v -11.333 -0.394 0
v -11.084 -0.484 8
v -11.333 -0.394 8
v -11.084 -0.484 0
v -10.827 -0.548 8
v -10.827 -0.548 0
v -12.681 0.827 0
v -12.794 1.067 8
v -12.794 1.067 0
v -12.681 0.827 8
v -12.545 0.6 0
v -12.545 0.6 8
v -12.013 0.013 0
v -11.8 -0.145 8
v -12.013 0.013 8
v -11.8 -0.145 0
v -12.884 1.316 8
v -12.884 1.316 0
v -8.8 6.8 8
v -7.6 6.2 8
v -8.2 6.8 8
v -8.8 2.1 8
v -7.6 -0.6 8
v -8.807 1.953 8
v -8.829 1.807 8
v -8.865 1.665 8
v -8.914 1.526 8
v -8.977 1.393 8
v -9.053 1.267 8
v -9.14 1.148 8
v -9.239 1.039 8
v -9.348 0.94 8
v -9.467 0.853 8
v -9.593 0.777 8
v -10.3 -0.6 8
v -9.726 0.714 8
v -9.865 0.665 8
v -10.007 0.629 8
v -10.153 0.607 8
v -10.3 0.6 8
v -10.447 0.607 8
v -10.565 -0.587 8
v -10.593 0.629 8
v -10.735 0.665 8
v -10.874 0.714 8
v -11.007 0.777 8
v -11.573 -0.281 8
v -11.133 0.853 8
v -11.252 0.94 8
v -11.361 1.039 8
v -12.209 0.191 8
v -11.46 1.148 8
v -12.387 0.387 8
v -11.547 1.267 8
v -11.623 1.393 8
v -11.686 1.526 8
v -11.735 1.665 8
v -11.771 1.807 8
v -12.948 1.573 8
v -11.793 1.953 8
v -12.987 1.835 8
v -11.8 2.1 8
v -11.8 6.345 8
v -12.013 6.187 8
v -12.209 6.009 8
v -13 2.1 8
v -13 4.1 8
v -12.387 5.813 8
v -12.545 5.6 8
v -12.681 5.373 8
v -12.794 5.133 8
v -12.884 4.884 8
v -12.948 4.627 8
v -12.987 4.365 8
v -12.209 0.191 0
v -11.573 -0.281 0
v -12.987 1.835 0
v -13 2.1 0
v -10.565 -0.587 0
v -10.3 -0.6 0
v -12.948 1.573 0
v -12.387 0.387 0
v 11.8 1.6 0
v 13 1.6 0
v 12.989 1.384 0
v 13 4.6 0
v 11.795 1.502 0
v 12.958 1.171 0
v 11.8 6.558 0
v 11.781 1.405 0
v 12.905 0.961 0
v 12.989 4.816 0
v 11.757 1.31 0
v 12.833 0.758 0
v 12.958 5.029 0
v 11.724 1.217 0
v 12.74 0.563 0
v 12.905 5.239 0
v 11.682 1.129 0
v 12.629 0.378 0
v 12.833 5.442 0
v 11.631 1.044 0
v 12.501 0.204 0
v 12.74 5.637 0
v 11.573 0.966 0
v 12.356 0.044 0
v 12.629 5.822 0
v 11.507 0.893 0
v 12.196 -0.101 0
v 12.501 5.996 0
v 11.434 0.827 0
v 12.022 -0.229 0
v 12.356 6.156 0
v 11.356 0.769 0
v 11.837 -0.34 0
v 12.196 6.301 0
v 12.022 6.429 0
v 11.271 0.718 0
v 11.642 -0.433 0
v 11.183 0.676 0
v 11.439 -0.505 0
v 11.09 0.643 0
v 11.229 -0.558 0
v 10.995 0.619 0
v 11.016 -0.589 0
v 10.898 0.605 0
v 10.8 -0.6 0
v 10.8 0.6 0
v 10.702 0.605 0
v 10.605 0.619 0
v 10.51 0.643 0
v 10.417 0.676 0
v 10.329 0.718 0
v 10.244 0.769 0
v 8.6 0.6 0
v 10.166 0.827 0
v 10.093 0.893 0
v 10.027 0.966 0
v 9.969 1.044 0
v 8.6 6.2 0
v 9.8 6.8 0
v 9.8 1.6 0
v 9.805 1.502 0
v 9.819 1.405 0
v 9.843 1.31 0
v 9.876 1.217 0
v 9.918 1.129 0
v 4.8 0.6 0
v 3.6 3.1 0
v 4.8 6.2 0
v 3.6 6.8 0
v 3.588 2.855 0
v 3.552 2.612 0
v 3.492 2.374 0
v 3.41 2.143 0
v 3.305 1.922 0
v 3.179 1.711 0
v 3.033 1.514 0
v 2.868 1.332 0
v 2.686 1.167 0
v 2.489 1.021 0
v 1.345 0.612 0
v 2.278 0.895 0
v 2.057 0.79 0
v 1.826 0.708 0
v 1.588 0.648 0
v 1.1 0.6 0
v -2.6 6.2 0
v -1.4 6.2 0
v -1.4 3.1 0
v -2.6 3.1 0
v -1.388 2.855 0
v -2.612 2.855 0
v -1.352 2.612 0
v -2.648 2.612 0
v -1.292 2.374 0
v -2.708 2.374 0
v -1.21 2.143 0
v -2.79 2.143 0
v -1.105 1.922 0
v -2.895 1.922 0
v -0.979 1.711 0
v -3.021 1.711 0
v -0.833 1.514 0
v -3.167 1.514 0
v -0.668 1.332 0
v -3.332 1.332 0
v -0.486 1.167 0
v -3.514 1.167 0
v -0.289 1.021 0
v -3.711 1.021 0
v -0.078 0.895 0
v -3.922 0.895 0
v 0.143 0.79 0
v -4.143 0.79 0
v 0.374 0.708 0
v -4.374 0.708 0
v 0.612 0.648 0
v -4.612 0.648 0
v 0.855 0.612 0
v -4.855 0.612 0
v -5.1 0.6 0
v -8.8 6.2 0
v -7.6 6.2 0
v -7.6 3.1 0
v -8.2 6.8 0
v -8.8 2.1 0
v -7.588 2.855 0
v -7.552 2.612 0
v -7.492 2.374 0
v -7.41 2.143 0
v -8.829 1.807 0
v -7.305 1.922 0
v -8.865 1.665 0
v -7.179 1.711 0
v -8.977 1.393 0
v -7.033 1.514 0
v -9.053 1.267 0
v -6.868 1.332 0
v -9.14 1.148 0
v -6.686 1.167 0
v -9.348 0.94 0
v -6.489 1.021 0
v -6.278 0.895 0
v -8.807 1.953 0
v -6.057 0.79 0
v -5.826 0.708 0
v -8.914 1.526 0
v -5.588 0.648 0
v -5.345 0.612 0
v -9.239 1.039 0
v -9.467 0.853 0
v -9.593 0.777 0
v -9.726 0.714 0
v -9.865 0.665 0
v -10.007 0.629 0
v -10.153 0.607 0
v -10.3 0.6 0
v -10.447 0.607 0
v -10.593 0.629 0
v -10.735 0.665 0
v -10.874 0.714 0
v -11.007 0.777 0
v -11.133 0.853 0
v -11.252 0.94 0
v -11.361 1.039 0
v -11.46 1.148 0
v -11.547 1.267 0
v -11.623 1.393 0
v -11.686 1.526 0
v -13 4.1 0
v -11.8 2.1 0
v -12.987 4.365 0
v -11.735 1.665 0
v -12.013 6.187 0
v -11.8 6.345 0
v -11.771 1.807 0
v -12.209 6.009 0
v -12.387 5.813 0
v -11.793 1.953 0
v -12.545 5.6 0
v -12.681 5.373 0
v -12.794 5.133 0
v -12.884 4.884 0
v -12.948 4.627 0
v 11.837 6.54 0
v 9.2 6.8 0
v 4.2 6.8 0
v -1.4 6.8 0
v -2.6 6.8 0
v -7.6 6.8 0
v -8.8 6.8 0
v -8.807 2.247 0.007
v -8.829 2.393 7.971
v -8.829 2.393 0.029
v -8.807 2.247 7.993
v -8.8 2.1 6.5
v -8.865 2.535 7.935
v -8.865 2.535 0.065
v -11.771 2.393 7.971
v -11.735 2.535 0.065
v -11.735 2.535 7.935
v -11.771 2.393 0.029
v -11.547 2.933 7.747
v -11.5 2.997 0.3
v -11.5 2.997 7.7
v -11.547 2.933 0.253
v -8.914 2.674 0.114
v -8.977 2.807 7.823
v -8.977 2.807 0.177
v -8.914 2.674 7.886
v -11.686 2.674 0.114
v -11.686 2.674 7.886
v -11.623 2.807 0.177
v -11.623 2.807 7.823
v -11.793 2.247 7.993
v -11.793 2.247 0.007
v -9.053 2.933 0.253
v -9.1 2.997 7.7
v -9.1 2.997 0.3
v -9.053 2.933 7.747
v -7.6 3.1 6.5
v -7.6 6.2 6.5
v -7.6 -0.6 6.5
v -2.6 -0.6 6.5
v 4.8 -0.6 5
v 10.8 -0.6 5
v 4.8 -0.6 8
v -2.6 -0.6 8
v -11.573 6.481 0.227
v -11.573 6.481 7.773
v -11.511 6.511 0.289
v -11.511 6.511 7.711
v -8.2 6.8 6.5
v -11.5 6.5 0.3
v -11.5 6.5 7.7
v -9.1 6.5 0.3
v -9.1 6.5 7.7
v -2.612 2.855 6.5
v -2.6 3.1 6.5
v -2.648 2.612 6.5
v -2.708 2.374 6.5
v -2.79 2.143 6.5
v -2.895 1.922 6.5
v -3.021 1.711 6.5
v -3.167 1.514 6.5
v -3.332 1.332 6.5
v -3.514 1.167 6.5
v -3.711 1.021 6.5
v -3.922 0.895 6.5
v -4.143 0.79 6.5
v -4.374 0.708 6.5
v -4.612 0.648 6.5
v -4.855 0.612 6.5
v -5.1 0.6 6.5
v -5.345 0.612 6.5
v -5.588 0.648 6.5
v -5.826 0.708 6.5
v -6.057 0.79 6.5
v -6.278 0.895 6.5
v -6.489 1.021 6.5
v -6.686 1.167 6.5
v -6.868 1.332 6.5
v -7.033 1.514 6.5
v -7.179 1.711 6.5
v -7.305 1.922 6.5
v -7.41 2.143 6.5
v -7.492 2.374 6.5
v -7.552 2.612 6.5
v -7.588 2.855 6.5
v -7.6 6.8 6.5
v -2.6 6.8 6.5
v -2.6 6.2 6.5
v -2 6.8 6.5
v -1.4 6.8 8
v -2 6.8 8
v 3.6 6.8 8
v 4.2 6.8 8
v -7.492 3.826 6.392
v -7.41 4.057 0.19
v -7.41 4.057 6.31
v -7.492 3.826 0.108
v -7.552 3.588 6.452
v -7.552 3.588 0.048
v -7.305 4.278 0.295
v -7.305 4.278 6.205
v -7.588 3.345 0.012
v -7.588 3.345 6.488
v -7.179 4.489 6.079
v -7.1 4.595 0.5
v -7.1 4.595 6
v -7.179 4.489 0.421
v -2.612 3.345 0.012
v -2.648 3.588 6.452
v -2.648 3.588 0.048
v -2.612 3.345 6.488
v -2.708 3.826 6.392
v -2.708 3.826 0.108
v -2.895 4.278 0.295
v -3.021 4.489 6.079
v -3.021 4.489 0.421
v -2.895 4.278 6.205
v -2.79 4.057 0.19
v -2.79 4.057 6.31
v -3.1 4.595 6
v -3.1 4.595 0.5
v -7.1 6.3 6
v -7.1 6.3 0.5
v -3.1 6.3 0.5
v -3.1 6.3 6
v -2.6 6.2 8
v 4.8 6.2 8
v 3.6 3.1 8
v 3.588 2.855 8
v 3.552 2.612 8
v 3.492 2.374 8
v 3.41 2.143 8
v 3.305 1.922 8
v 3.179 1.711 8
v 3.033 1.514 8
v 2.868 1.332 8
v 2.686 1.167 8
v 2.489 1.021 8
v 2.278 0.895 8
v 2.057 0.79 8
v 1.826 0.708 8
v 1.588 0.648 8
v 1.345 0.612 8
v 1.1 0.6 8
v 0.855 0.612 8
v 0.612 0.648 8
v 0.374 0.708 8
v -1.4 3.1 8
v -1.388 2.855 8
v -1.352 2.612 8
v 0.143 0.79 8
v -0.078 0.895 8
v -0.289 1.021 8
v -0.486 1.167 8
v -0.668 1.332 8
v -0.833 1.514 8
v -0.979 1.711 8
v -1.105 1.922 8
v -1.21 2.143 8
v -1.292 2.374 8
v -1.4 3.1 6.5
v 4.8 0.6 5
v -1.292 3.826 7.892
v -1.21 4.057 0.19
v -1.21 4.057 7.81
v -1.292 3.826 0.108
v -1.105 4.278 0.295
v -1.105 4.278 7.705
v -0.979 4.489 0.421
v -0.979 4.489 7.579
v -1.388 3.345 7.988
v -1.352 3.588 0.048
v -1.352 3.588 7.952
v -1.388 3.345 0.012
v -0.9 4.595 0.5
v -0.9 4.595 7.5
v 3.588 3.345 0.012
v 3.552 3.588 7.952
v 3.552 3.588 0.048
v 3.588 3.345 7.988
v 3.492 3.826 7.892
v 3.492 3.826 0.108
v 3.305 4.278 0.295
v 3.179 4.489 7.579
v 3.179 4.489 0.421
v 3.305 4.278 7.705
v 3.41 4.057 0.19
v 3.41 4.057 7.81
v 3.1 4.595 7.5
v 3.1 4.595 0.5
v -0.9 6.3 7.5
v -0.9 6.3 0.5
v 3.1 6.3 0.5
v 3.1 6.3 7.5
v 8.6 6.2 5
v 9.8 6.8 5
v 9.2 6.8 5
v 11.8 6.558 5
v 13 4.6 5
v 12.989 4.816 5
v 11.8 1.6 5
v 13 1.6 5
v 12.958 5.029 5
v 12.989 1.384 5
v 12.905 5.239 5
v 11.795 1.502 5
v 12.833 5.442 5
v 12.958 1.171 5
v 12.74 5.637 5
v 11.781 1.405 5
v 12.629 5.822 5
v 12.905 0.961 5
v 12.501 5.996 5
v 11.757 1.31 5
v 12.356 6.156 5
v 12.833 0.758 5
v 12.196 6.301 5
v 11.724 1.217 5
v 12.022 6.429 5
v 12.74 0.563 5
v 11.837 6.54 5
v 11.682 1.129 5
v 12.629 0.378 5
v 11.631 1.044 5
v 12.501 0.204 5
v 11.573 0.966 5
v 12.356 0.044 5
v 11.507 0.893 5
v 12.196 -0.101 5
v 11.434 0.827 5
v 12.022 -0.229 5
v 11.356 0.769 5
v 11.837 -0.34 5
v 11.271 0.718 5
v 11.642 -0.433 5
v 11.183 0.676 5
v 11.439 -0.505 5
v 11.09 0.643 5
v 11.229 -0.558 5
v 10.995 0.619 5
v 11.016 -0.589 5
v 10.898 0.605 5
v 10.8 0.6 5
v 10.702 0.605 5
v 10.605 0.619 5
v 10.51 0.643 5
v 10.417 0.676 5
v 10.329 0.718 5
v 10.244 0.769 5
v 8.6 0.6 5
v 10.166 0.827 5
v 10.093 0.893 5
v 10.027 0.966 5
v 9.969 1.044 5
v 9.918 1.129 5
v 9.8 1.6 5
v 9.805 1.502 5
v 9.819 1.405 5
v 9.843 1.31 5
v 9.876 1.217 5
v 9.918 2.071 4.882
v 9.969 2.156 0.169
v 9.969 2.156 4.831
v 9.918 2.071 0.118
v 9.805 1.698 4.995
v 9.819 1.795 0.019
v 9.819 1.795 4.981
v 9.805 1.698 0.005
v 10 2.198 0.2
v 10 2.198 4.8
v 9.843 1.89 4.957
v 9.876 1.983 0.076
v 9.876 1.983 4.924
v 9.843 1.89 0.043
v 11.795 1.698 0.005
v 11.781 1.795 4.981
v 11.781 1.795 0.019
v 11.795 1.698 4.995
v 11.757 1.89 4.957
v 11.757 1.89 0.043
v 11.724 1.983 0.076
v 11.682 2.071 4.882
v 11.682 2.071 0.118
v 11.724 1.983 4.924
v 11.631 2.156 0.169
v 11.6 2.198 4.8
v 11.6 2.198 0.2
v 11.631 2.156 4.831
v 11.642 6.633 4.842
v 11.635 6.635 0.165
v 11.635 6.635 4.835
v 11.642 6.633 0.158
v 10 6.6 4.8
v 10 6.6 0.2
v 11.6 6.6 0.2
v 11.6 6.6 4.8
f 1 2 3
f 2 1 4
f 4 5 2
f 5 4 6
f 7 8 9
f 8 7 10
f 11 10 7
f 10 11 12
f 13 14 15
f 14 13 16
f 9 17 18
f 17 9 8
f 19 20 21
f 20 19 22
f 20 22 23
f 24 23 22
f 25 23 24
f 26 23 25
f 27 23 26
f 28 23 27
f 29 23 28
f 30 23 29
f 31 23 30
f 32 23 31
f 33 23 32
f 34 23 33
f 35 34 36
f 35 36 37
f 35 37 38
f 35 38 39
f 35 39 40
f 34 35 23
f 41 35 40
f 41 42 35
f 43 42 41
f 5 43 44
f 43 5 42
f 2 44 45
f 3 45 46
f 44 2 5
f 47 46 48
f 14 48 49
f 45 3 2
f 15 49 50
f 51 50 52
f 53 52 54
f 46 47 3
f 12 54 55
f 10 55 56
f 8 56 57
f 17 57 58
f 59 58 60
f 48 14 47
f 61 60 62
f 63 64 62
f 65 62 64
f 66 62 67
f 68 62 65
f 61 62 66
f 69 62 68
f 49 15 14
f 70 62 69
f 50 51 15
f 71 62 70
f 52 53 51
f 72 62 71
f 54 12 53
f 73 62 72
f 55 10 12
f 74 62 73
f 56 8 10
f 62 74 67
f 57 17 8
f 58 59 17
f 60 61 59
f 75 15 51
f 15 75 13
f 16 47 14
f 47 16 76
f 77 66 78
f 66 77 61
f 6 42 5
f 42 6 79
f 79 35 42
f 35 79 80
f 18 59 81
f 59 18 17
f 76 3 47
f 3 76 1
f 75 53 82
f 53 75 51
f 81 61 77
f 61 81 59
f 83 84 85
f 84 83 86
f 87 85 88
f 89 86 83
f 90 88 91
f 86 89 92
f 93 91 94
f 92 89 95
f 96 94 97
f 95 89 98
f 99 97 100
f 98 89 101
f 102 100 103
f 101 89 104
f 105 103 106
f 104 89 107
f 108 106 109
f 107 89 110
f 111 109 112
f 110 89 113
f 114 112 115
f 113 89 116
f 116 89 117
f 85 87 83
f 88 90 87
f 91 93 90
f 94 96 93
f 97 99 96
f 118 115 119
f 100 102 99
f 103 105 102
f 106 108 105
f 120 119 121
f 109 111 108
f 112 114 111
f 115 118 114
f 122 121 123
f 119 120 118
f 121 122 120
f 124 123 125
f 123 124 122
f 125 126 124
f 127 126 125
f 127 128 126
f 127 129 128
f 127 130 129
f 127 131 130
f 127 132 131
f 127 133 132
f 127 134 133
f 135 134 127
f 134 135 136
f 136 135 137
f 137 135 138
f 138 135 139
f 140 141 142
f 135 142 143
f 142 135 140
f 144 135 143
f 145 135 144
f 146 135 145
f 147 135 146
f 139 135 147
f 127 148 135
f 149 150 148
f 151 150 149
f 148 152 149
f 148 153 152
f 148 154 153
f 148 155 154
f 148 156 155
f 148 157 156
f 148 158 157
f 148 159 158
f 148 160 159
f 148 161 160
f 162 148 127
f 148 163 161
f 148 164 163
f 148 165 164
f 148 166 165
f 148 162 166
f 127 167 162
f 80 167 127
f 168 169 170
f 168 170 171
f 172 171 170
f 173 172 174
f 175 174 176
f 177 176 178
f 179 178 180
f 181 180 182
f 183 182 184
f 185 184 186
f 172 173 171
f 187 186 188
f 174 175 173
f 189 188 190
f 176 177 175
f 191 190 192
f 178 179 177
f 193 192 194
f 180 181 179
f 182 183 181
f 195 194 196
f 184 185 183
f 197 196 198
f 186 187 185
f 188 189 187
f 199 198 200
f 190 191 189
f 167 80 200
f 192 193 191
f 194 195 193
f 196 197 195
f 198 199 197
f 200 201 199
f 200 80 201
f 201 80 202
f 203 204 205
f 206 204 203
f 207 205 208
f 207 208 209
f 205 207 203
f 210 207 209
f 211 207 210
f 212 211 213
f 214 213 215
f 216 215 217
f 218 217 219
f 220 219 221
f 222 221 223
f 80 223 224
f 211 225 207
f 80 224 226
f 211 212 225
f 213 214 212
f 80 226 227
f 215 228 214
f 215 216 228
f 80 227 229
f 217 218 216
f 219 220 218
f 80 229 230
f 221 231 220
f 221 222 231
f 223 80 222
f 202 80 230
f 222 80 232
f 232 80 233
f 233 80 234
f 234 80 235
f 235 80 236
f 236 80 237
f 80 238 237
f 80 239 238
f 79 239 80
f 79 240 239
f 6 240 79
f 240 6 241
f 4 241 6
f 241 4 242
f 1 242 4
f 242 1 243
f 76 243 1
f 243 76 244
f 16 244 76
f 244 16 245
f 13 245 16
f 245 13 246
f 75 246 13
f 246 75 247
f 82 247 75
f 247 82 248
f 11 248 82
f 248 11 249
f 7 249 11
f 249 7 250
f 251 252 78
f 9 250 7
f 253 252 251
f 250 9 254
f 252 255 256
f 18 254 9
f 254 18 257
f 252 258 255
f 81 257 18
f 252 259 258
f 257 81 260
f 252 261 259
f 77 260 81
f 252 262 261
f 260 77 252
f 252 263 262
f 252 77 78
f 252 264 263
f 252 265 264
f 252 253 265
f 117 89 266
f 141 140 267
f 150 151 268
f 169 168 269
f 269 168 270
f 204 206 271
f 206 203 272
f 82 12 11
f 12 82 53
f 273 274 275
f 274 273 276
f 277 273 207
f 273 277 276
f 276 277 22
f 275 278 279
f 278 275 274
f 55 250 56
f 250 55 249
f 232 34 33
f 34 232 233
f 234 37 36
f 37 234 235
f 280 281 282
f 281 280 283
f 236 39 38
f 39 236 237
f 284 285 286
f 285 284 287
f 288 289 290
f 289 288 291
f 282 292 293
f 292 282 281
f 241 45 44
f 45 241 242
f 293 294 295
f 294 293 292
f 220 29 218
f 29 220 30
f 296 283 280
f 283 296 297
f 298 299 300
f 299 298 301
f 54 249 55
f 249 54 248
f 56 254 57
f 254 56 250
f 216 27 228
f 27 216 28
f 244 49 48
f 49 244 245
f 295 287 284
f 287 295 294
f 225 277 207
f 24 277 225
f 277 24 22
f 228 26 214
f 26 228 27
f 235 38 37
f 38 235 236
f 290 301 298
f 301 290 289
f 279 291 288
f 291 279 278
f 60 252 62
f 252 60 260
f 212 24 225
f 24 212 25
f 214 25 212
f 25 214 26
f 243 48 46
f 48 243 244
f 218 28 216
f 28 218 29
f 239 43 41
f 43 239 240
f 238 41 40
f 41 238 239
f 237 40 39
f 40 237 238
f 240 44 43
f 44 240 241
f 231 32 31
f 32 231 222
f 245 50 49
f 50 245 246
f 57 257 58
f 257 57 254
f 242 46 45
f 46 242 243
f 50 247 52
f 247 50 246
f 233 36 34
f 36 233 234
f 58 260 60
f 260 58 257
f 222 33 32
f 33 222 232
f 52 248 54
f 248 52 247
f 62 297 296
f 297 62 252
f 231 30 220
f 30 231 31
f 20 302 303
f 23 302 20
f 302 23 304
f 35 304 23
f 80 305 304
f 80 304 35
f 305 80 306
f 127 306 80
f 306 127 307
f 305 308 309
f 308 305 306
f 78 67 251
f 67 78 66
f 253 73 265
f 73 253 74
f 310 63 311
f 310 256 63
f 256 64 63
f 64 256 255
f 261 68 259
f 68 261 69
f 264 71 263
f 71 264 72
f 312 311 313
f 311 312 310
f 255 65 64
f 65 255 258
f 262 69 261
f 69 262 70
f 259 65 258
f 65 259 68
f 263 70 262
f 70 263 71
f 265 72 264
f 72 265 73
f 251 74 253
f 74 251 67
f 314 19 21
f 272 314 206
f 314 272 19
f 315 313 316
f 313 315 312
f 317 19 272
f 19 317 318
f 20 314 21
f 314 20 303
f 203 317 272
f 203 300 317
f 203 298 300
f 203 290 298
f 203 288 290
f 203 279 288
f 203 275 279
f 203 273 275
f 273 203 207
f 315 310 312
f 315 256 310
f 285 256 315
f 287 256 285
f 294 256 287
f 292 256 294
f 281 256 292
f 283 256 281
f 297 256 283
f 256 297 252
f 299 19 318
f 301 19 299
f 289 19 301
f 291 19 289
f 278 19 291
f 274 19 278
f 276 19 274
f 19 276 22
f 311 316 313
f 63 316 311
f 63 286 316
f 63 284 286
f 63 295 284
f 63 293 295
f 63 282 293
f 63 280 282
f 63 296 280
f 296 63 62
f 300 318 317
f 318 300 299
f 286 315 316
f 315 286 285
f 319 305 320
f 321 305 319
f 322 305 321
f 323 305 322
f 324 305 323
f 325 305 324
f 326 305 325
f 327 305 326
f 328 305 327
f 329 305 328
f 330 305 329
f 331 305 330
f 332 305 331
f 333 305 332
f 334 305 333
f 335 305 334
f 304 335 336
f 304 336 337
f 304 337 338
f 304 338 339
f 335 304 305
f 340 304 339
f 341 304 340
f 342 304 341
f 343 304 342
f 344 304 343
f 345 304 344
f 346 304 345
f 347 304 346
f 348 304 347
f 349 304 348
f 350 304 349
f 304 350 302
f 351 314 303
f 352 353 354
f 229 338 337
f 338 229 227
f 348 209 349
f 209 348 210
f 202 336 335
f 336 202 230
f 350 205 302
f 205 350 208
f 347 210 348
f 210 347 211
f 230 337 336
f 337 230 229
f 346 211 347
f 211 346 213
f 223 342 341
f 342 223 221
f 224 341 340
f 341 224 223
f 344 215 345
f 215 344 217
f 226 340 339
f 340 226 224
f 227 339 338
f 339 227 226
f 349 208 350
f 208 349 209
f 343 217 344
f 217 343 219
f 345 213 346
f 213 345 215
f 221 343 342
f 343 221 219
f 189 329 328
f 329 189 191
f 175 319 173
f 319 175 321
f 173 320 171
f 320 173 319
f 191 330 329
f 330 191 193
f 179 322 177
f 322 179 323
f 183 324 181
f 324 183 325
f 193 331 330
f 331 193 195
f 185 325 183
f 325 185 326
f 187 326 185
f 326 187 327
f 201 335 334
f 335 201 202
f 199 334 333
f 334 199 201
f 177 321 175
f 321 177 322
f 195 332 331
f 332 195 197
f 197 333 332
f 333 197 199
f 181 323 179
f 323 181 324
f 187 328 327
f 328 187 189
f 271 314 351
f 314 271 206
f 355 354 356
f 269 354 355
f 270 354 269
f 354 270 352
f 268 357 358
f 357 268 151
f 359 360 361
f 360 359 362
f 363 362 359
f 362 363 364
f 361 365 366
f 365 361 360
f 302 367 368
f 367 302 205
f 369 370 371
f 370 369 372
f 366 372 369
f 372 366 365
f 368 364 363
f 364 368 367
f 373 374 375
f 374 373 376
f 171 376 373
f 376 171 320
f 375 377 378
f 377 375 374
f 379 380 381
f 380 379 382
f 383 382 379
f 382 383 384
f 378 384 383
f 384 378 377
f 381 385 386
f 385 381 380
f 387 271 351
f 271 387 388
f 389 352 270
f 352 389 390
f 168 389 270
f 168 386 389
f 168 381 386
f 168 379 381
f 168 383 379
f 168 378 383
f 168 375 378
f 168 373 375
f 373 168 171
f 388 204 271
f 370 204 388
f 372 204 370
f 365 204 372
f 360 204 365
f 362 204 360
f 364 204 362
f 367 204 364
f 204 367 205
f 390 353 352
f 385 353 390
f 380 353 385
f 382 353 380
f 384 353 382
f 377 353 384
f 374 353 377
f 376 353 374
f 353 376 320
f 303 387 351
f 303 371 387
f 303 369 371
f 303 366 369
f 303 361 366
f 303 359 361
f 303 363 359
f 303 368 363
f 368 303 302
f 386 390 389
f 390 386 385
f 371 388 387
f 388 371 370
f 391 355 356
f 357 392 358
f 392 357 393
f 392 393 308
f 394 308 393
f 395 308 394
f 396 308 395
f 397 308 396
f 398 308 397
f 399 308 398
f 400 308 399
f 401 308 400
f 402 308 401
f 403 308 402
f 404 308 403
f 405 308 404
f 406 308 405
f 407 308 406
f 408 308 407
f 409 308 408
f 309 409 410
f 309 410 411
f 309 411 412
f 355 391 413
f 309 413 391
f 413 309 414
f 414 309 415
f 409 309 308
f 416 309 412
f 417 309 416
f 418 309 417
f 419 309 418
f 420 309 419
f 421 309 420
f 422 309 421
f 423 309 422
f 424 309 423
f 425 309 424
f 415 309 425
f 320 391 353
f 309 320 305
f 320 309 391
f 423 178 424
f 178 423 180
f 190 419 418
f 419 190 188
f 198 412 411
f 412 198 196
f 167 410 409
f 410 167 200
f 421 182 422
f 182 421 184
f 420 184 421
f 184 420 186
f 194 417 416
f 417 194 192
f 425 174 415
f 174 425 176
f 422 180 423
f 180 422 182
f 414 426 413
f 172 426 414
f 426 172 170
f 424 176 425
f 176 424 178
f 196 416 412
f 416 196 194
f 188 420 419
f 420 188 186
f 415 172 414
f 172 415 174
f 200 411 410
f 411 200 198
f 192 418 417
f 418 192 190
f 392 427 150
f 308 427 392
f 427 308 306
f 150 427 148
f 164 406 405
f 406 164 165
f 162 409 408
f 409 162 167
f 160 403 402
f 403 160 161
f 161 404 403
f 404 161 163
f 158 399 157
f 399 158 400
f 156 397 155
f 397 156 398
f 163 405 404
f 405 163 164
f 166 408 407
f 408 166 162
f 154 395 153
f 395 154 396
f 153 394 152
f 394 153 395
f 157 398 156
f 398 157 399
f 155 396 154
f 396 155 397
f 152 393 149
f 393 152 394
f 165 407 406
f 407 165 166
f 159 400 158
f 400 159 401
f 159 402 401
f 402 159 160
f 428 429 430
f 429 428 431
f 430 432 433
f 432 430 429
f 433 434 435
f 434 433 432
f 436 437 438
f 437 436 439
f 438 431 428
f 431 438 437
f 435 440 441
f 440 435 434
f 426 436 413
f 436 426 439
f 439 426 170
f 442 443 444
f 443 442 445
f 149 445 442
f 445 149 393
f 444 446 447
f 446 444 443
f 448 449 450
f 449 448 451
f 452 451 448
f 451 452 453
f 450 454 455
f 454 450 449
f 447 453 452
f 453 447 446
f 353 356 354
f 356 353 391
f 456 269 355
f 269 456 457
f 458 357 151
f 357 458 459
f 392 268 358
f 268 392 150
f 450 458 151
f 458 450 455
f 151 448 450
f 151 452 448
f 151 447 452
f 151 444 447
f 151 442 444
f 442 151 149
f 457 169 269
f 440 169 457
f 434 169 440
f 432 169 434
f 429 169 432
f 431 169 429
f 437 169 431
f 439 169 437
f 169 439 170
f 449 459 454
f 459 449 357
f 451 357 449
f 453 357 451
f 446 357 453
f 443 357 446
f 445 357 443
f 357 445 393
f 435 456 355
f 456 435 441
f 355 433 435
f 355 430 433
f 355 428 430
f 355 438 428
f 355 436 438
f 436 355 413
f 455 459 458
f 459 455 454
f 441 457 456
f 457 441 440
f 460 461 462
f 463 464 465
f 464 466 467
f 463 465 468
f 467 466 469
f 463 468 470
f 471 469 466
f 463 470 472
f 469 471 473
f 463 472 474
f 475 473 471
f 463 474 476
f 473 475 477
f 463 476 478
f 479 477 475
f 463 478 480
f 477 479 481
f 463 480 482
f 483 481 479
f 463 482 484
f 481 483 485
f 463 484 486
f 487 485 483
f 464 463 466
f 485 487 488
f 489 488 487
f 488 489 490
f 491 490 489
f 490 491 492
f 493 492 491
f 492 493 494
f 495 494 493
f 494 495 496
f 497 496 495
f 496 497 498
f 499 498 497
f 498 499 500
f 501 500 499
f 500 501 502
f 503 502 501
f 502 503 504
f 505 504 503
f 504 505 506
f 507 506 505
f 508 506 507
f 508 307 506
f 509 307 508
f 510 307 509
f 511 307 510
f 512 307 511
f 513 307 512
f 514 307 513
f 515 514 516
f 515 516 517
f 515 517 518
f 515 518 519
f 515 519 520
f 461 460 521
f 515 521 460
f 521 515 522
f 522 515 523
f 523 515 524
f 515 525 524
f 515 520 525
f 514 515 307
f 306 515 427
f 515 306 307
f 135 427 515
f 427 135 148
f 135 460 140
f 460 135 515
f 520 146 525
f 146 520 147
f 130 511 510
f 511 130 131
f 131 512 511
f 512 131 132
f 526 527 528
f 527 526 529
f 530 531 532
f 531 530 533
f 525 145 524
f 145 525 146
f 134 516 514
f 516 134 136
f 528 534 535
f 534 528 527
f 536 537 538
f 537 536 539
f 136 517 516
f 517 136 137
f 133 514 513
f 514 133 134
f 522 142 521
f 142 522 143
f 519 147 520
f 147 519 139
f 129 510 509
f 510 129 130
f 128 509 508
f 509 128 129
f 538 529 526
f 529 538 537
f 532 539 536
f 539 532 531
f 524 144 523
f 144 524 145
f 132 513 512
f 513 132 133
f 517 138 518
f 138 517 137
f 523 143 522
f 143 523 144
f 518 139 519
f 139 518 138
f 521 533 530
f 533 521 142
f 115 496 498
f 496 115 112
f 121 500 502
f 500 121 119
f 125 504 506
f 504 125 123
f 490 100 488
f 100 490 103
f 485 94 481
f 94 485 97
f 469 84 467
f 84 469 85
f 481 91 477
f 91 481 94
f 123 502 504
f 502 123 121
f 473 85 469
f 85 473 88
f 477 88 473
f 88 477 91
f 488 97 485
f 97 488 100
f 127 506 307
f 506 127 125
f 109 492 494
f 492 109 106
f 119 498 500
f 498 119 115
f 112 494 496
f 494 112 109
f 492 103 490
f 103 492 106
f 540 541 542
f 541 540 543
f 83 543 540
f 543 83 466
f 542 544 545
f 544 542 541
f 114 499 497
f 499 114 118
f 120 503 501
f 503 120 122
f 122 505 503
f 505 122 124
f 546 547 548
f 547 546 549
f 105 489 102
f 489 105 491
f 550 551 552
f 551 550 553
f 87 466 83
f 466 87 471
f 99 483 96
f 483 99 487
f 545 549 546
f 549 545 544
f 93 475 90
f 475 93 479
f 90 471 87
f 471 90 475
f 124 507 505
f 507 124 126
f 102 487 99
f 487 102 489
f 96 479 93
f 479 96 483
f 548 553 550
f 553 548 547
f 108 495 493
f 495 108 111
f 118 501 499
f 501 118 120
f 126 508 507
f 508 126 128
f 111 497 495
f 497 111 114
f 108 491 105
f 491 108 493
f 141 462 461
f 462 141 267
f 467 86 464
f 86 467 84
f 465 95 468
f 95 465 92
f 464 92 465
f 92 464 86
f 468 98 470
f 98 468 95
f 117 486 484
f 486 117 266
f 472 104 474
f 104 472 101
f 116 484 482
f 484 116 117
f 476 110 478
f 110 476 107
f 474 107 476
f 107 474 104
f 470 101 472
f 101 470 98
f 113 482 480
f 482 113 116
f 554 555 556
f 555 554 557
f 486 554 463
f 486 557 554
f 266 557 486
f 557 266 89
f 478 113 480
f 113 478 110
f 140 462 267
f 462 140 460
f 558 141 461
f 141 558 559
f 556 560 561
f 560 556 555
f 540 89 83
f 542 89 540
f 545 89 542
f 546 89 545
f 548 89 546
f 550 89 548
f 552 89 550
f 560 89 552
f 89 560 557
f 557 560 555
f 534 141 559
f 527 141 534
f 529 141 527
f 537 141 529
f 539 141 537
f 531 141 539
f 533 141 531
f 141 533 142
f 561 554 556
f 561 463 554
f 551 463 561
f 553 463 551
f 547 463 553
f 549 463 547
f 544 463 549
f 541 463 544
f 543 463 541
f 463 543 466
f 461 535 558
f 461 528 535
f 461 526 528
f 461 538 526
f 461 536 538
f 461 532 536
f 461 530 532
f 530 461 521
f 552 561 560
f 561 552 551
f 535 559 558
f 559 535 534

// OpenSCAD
include <../utp-cable-organizer.scad>

// Example C3: Advanced usage
settings_cables_dia = [[3,5,5,2]];

// undef gets filled with default_height
settings_height = [[default_height, 6.5, undef, 5]];
settings_cable_spacing = [[0,0,5]];
settings_cable_spacing_length = "b";
